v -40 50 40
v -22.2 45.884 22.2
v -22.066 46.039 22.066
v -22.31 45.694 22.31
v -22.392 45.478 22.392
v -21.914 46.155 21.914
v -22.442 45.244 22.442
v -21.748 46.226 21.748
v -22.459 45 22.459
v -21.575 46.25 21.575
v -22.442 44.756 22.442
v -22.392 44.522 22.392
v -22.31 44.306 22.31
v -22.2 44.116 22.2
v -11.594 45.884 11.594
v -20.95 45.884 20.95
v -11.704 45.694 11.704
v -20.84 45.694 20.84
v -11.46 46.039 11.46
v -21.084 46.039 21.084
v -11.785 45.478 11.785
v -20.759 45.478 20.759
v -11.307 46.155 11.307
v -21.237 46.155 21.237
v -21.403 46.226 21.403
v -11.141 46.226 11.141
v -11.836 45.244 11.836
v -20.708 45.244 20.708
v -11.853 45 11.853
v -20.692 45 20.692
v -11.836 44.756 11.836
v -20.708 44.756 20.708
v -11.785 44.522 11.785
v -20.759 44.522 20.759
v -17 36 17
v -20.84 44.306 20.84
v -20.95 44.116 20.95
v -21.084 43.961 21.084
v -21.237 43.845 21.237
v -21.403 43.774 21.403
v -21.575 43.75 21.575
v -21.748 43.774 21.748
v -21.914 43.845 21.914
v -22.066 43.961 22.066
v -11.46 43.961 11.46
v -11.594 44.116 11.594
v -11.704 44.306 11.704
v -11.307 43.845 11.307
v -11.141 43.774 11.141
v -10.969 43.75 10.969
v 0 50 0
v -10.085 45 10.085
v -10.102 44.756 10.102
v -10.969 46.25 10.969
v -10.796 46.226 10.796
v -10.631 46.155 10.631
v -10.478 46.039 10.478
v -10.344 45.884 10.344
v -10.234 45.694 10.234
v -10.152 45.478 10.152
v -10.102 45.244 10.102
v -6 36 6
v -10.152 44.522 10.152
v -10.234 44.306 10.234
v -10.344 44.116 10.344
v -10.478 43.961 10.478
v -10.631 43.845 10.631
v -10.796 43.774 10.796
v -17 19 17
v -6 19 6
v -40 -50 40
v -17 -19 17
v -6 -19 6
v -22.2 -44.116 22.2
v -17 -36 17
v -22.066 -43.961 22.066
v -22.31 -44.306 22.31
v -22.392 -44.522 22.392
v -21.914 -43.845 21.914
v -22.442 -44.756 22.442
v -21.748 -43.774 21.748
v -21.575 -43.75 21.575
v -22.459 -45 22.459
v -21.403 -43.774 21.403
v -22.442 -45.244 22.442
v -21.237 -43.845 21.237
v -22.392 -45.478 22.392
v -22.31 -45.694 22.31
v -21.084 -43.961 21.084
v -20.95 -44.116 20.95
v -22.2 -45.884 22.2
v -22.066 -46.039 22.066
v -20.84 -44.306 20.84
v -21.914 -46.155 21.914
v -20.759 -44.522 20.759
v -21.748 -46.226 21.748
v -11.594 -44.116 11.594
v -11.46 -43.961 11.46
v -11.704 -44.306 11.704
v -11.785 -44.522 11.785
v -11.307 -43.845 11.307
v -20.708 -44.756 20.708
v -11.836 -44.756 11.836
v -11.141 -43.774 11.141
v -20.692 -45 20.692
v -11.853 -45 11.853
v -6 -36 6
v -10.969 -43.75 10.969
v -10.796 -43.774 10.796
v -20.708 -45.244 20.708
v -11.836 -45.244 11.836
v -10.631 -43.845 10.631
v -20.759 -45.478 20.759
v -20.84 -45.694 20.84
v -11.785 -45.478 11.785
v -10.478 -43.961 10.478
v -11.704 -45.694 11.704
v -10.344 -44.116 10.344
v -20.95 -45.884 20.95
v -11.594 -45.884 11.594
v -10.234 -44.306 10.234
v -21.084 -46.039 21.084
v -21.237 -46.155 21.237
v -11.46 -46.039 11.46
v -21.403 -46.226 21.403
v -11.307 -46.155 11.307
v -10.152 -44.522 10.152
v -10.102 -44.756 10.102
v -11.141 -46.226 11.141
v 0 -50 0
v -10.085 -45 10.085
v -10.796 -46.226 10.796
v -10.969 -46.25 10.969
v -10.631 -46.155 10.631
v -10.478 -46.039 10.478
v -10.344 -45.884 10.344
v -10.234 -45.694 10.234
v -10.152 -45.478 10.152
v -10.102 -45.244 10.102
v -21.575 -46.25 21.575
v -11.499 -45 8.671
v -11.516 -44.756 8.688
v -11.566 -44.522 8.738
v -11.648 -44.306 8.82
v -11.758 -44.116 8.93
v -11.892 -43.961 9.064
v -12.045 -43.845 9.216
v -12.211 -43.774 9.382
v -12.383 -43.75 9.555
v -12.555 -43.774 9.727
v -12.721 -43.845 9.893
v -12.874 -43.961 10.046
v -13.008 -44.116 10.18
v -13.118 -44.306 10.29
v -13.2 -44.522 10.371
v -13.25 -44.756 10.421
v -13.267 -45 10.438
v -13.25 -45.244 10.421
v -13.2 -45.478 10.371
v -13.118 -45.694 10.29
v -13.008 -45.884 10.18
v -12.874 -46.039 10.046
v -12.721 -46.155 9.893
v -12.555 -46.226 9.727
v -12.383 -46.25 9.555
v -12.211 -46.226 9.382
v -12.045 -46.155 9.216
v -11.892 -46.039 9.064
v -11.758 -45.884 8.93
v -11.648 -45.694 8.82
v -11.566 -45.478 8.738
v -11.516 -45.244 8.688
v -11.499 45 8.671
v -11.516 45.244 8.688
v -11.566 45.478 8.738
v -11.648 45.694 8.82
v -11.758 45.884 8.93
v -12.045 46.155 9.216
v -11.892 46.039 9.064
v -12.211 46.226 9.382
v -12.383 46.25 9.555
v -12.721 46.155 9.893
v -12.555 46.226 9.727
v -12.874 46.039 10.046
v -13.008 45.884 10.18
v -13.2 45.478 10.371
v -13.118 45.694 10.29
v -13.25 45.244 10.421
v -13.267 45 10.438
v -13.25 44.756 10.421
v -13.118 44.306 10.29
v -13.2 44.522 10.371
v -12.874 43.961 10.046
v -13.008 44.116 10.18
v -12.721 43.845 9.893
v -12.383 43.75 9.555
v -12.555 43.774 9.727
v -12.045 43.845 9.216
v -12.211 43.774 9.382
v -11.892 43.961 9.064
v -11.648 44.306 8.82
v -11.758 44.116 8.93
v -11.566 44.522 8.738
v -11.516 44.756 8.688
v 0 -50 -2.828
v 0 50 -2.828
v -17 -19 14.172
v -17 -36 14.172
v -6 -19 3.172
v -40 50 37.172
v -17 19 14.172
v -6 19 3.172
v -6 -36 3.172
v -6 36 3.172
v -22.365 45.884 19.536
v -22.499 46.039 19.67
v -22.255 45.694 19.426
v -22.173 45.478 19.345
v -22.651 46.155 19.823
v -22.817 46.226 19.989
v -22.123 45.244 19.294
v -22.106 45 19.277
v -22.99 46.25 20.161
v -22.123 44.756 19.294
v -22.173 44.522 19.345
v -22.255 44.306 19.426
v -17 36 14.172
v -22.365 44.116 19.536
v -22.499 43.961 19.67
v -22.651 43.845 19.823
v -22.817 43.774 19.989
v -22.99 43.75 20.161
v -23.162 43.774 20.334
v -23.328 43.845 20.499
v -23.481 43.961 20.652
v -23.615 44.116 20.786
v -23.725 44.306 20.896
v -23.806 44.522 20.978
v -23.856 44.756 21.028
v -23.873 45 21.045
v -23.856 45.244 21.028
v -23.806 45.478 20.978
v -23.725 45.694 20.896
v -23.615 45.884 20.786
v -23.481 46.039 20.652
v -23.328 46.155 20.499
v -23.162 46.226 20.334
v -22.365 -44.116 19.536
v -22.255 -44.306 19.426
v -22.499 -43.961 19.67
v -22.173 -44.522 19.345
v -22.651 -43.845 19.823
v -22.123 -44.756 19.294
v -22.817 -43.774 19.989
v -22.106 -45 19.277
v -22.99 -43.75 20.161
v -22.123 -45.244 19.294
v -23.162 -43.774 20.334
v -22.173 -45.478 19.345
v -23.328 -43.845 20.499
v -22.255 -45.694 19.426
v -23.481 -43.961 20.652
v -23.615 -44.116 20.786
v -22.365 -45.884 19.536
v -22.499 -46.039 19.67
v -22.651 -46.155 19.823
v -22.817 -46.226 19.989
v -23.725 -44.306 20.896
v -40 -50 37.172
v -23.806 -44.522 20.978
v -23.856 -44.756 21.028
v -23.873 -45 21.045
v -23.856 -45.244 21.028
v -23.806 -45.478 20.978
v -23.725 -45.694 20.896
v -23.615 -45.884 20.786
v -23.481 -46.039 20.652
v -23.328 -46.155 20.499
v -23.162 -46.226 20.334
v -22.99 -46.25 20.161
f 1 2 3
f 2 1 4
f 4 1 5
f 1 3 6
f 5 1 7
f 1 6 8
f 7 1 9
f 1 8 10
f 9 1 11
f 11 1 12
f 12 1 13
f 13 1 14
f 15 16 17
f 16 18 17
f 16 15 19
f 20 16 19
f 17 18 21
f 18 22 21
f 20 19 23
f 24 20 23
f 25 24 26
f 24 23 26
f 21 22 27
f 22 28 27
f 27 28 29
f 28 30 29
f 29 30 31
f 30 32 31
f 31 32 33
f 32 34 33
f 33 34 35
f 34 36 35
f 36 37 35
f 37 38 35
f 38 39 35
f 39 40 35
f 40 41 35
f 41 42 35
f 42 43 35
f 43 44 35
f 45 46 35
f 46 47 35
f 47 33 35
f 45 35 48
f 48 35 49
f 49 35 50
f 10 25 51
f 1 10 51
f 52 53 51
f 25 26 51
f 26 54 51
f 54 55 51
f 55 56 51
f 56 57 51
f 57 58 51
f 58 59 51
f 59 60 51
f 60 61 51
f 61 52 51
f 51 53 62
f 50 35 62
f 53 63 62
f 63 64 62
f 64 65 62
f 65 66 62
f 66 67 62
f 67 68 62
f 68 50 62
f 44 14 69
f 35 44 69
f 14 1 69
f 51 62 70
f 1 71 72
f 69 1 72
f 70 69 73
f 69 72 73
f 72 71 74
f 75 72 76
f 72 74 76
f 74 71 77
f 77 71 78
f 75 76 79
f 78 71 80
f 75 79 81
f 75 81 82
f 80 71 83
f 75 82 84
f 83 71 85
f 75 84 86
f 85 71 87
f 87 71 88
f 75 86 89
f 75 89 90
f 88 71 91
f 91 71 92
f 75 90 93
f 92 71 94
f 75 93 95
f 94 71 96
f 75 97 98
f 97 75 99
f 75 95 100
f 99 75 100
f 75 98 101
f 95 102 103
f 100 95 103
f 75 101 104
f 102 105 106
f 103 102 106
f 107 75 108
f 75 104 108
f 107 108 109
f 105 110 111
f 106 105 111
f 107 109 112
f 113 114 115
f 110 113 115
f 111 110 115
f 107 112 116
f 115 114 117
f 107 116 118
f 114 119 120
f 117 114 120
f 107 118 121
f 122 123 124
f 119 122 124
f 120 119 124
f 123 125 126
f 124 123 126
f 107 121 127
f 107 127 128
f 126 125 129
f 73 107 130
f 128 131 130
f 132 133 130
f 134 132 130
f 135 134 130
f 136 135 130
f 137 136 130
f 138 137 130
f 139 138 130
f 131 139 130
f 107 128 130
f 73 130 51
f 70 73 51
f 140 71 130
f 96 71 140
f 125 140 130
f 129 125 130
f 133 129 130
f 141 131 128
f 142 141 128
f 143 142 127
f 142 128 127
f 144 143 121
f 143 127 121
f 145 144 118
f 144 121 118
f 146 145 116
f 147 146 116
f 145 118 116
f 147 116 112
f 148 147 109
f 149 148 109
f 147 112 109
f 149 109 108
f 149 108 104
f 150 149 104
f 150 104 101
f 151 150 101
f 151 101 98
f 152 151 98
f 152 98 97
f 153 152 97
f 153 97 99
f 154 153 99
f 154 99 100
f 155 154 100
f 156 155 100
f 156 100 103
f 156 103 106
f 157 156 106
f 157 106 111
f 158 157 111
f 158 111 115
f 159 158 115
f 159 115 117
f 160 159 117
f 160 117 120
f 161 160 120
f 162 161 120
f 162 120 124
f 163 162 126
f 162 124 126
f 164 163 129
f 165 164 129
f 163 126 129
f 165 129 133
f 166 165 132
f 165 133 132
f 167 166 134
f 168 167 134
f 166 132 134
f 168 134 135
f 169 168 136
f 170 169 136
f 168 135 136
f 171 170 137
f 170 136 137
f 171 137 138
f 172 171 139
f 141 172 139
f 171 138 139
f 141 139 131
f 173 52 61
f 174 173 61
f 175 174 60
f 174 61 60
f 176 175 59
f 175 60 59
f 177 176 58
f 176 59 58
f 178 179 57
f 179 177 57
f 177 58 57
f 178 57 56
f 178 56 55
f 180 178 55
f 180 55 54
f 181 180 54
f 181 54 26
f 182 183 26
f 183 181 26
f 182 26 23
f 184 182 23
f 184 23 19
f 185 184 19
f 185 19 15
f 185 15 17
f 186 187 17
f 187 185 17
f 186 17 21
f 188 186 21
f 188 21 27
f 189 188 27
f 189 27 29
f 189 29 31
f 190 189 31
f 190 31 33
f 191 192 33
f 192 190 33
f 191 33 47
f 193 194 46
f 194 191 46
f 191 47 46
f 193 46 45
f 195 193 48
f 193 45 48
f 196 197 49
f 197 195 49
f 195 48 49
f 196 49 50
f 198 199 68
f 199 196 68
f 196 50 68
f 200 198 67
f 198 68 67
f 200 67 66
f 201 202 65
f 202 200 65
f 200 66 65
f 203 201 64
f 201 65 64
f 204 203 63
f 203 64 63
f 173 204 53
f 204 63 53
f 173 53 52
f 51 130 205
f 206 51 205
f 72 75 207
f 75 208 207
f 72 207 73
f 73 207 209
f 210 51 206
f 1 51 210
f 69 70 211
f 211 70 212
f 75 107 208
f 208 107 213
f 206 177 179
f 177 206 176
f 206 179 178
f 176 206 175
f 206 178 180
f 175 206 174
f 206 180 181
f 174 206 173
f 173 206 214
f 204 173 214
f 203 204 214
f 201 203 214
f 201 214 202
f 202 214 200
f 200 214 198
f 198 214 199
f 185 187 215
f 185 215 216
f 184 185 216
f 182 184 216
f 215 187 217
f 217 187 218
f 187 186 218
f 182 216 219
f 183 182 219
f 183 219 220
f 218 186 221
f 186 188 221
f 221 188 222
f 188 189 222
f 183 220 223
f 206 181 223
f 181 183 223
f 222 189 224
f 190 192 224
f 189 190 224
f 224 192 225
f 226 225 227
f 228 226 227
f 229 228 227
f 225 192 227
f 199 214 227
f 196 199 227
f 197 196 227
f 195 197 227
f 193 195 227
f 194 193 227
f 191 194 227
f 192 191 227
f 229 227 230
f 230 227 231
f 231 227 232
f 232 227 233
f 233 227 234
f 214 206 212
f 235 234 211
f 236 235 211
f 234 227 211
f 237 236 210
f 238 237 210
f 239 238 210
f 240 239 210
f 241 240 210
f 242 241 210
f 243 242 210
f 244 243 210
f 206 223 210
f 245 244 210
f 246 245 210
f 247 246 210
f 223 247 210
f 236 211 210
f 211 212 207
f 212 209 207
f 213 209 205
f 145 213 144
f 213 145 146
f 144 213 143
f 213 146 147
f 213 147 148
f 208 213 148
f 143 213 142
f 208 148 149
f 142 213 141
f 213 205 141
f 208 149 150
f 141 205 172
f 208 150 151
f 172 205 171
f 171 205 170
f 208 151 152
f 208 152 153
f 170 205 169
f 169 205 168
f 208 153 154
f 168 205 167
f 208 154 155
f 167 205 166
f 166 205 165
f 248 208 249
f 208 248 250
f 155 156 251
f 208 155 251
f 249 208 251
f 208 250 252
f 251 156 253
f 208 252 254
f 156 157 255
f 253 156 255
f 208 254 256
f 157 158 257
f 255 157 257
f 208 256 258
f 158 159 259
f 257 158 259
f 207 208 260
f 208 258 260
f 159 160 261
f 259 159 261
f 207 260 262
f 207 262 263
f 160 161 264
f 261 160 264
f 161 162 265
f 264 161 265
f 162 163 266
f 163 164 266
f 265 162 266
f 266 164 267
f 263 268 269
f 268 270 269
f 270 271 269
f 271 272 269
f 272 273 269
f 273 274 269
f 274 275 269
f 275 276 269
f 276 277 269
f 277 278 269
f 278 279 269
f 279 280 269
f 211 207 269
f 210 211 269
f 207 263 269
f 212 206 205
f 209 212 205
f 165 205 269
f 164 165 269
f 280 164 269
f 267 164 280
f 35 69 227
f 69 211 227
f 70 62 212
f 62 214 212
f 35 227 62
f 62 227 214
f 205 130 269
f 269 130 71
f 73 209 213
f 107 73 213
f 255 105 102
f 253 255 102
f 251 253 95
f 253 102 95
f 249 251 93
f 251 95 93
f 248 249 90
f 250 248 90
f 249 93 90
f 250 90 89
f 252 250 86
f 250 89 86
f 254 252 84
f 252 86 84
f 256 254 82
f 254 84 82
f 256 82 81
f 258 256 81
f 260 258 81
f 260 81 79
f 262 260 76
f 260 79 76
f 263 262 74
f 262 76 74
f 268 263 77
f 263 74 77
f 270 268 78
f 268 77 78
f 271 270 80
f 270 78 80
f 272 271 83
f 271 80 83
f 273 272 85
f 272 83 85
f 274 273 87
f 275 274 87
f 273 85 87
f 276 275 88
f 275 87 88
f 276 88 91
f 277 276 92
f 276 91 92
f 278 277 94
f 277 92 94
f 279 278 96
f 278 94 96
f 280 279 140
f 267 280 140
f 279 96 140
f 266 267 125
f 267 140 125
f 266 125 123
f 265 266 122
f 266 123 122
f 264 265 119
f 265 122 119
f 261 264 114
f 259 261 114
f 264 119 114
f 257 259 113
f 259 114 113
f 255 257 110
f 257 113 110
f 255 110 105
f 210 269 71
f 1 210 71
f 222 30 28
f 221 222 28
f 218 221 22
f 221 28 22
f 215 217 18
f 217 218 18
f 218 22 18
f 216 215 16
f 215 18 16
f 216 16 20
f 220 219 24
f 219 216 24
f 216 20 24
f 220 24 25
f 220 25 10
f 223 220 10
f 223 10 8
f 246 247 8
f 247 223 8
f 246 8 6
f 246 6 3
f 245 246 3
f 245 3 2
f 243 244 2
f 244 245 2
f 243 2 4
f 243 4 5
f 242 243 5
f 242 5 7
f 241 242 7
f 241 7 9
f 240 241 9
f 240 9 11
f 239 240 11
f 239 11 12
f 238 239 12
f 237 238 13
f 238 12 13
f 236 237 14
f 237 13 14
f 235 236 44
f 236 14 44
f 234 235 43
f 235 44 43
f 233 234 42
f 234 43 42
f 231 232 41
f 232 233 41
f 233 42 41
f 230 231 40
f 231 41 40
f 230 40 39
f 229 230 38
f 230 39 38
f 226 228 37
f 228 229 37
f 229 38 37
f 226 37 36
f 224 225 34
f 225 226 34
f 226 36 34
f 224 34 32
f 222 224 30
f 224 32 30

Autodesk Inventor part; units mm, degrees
ref_plane "YZ Plane" through (0, 0, 0) normal (1, 0, 0) x (0, 1, 0)
ref_plane "XZ Plane" through (0, 0, 0) normal (0, 1, 0) x (-1, 0, 0)
ref_plane "XY Plane" through (0, 0, 0) normal (0, 0, 1) x (1, 0, 0)
sketch "Sketch1" plane through (0, 0, 0) normal (0, 1, 0) x (-1, 0, 0)
  line L0 (0, 0) -> (0, -2.8284)
  line L1 (0, -2.8284) -> (29, 26.1716)
  line L2 (29, 26.1716) -> (29, 29)
  line L3 (29, 29) -> (0, 0)
  line L4 (29, 26.1716) -> (40, 37.1716)
  line L5 (40, 37.1716) -> (40, 40)
  line L6 (40, 40) -> (29, 29)
  dimension "d2" = 29
  dimension "d3" = 45
  dimension "d6" = 2
  dimension "d23" = 11
  dimension "d24" = 45
  dimension "d25" = 45
extrude "Extrusion1" add sketch "Sketch1" along normal mid plane 100 contours L3 L2 L1 L0
sketch "Sketch2" plane through (0, 0, 0) normal (0, 0, 1) x (1, 0, 0)
  line L0 (-17, 36) -> (-6, 36)
  line L1 (-6, 36) -> (-6, 19)
  line L2 (-6, 19) -> (-17, 19)
  line L3 (-17, 19) -> (-17, 36)
  line L4 (0, 50) -> (-29, 50) projected
  line L5 (0, -50) -> (0, 50) projected
  point P0 (0, 0)
  dimension "d7" = 14
  dimension "d8" = 17
  dimension "d9" = 11
  dimension "d11" = 6
extrude "Extrusion2" cut sketch "Sketch2" along normal up to next
mirror "Mirror1" about plane through (0, 0, 0) normal (0, 1, 0) of "Extrusion2"
sketch "Sketch3" plane through (0, -50, 0) normal (0.7071, 0, 0.7071) x (0.7071, 0, -0.7071)
  circle A0 centre (-30.5122, 5) radius 1.25
  circle A1 centre (-15.5122, 5) radius 1.25
  line L0 (-39.0122, 0) -> (-39.0122, 100) projected
  line L1 (-41.0122, 0) -> (-41.0122, 100) projected
  line L2 (0, 0) -> (-41.0122, 0) projected
  point P0 (0, 50)
  dimension "d15" = 5
  dimension "d16" = 2.5
  dimension "d17" = 15
  dimension "d18" = 2.5
  dimension "d19" = 5
  dimension "d20" = 10.5
extrude "Extrusion3" cut sketch "Sketch3" against normal up to next
mirror "Mirror2" about plane through (0, 0, 0) normal (0, 1, 0) of "Extrusion3"
extrude "Extrusion4" add sketch "Sketch1" along normal mid plane 100 contours L6 L5 L4 L2
properties part number "Front_Dluzszy_3"
